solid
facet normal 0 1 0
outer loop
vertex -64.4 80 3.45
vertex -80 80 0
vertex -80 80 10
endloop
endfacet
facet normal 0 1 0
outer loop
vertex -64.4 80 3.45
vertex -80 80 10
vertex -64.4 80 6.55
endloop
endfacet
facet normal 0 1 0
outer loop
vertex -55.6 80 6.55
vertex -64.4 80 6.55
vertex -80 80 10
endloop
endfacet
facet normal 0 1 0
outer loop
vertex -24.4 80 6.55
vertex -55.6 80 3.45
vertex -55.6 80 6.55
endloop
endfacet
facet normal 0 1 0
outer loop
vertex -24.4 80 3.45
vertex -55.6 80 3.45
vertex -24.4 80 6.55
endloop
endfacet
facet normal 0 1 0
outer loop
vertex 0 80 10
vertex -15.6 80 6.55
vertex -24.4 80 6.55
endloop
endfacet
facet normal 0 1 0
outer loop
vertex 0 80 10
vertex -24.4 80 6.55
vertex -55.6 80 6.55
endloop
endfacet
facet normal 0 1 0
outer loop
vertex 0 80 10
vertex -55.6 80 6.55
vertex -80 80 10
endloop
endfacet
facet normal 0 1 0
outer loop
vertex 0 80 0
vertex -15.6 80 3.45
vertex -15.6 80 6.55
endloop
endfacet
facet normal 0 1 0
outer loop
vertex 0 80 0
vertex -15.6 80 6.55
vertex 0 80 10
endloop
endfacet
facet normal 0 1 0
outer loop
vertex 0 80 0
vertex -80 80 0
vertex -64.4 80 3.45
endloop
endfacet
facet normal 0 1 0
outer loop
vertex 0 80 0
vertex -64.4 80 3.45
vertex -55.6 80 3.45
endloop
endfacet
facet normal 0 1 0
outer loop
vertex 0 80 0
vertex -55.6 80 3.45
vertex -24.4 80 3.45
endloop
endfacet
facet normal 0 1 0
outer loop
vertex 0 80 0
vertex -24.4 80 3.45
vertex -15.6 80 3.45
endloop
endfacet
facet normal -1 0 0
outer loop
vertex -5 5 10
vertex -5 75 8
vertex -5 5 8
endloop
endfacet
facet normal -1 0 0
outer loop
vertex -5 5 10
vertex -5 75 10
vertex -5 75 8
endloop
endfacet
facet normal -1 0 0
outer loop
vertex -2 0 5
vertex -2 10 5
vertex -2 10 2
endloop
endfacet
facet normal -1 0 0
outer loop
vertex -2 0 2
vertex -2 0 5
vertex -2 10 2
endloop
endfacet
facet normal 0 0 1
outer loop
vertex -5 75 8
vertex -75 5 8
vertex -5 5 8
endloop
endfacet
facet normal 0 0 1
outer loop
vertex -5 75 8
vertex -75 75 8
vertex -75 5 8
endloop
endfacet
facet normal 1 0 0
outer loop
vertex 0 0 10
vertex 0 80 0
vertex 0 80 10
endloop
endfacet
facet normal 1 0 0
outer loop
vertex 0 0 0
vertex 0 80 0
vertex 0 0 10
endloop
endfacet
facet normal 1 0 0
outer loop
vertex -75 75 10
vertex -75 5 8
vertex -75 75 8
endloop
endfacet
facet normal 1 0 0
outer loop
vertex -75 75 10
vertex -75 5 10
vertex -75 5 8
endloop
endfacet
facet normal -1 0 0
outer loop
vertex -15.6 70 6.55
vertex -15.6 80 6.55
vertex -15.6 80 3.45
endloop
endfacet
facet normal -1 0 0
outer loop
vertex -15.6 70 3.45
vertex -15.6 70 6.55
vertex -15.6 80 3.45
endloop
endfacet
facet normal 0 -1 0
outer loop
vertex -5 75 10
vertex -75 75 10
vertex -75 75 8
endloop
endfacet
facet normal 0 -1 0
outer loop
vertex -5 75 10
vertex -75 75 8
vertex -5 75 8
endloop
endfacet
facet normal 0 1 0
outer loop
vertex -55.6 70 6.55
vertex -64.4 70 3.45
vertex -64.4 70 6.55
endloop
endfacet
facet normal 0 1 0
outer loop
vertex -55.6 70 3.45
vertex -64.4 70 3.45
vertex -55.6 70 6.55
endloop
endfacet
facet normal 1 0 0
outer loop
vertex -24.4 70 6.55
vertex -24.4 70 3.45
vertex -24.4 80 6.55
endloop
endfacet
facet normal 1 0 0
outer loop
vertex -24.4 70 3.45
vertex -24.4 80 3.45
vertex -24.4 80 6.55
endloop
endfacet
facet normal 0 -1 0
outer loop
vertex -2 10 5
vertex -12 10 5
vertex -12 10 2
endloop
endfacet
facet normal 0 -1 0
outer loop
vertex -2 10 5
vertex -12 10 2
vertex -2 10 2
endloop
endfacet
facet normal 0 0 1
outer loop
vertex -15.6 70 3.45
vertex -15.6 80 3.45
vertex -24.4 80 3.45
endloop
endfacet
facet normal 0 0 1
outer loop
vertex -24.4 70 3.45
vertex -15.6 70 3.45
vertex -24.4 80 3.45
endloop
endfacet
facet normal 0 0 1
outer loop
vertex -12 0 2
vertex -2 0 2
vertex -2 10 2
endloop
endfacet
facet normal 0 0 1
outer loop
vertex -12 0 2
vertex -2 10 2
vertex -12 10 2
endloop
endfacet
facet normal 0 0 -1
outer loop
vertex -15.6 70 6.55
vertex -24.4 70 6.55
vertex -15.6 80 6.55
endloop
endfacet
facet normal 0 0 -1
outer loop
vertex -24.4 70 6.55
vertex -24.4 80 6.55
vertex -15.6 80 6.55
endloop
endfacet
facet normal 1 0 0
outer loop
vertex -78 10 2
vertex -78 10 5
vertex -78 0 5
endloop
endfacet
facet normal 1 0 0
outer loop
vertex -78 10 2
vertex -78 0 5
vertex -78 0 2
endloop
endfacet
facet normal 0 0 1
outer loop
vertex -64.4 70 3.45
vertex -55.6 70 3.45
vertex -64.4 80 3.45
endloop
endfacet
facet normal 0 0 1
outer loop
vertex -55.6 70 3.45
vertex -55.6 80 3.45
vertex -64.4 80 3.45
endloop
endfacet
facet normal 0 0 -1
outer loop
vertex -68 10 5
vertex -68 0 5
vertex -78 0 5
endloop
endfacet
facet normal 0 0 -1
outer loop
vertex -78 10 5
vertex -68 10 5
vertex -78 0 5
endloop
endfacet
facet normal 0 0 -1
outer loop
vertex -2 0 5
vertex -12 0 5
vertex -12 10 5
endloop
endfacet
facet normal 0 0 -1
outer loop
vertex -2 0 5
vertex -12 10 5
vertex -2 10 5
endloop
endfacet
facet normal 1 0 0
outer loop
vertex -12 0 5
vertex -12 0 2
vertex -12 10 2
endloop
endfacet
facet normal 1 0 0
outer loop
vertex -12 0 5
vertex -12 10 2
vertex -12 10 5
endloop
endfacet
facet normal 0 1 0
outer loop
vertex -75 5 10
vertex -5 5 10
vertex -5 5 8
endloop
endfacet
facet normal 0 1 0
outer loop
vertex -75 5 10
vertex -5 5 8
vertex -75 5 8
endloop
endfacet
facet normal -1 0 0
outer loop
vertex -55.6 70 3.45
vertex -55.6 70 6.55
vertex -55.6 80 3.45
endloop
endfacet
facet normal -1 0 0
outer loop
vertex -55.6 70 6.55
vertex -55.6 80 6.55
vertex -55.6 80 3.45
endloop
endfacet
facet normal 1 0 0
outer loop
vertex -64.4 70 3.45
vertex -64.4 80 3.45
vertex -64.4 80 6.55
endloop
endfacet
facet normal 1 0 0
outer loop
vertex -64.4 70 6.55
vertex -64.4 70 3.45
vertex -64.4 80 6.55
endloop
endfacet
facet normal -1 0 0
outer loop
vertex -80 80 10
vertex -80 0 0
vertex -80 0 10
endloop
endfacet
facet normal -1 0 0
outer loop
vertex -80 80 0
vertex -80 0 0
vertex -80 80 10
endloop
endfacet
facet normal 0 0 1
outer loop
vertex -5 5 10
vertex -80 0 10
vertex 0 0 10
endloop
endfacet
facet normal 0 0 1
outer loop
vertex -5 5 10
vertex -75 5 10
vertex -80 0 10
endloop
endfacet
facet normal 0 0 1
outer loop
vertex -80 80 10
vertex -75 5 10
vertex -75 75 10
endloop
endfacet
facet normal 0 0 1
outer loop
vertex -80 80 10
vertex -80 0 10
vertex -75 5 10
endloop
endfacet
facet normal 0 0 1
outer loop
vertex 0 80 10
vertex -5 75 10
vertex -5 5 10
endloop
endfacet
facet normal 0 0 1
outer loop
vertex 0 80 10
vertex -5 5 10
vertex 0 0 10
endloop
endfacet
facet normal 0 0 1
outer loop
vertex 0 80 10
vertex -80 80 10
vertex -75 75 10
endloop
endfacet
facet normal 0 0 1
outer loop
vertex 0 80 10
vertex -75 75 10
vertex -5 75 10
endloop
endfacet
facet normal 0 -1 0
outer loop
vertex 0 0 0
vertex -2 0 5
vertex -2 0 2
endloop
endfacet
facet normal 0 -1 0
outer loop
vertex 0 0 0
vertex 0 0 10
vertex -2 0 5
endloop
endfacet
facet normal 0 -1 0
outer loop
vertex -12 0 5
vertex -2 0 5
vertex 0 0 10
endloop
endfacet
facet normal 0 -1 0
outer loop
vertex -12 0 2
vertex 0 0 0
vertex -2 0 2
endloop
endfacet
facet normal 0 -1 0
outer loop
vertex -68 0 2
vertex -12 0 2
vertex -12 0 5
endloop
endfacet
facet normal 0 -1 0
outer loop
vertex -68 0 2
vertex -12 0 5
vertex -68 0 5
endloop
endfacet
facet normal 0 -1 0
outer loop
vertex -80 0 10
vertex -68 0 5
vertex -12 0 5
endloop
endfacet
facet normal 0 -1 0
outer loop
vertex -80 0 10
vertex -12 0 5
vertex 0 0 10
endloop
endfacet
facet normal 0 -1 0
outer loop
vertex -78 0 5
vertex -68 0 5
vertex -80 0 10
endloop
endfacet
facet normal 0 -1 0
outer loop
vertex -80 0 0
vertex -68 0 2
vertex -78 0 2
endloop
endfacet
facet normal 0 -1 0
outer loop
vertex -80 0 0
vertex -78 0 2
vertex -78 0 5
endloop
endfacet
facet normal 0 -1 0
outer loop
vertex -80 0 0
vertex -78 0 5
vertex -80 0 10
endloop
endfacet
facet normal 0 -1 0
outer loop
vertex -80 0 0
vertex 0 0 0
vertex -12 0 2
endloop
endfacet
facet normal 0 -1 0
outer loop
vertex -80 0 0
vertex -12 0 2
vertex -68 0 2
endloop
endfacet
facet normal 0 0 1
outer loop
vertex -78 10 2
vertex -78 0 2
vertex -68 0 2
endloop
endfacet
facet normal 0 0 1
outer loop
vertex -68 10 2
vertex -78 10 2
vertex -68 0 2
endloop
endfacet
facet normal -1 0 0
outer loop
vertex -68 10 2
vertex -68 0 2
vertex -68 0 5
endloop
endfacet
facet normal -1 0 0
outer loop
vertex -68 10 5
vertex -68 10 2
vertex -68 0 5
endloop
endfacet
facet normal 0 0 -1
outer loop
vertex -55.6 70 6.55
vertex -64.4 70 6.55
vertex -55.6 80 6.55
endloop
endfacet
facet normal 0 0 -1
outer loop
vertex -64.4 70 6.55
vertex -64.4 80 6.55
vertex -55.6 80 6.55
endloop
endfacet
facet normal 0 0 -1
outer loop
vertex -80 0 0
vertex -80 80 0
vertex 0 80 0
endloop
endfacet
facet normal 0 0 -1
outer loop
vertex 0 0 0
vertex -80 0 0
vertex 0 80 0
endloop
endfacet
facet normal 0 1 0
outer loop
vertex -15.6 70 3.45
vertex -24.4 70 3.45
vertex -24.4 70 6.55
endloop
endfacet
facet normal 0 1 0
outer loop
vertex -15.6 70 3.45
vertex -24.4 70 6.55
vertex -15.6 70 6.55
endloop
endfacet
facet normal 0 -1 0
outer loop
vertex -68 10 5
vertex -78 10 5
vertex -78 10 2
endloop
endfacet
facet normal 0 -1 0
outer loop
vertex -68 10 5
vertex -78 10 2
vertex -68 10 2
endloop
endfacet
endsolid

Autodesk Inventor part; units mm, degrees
ref_plane "YZ Plane" through (0, 0, 0) normal (1, 0, 0) x (0, 1, 0)
ref_plane "XZ Plane" through (0, 0, 0) normal (0, 1, 0) x (-1, 0, 0)
ref_plane "XY Plane" through (0, 0, 0) normal (0, 0, 1) x (1, 0, 0)
sketch "Sketch1" plane through (0, 0, 0) normal (0, 0, 1) x (1, 0, 0)
  line L0 (0, 0) -> (-80, 0)
  line L1 (-80, 0) -> (-80, 80)
  line L2 (-80, 80) -> (0, 80)
  line L3 (0, 80) -> (0, 0)
  line L4 (-75, 75) -> (-5, 75)
  line L5 (-5, 75) -> (-5, 5)
  line L6 (-5, 5) -> (-75, 5)
  line L7 (-75, 5) -> (-75, 75)
  dimension "d0" = 80
  dimension "d1" = 80
  dimension "d2" = 70
  dimension "d3" = 70
extrude "Extrusion1" add sketch "Sketch1" along normal blind 10 contours L0 L1 L2 L3 | L4 L5 L6 L7
sketch "Sketch2" plane through (-80, 80, 0) normal (0, 1, 0) x (1, 0, 0)
  line L0 (24.4, -3.45) -> (15.6, -3.45)
  line L1 (15.6, -3.45) -> (15.6, -6.55)
  line L2 (15.6, -6.55) -> (24.4, -6.55)
  line L3 (24.4, -6.55) -> (24.4, -3.45)
  line L4 (64.4, -3.45) -> (55.6, -3.45)
  line L5 (55.6, -3.45) -> (55.6, -6.55)
  line L6 (55.6, -6.55) -> (64.4, -6.55)
  line L7 (64.4, -6.55) -> (64.4, -3.45)
  point P0 (80, 0)
  point P1 (20, -5)
  point P2 (60, -5)
  dimension "d8" = 8.8
  dimension "d9" = 3.1
  dimension "d12" = 8.8
  dimension "d13" = 3.1
extrude "Extrusion2" cut sketch "Sketch2" against normal blind 10
sketch "Sketch4" plane through (0, 0, 10) normal (0, 0, 1) x (1, 0, 0)
  line L0 (-5, 5) -> (-75, 5)
  line L1 (-75, 5) -> (-75, 75)
  line L2 (-75, 75) -> (-5, 75)
  line L3 (-5, 75) -> (-5, 5)
  point P0 (0, 0)
  dimension "d21" = 70
  dimension "d22" = 70
extrude "Extrusion3" cut sketch "Sketch4" against normal blind 2
sketch "Sketch5" plane through (-80, 0, 0) normal (0, -1, 0) x (1, 0, 0)
  line L0 (2, 2) -> (12, 2)
  line L1 (12, 2) -> (12, 5)
  line L2 (12, 5) -> (2, 5)
  line L3 (2, 5) -> (2, 2)
  line L4 (78, 2) -> (68, 2)
  line L5 (68, 2) -> (68, 5)
  line L6 (68, 5) -> (78, 5)
  line L7 (78, 5) -> (78, 2)
  point P0 (80, 0)
  dimension "d25" = 10
  dimension "d26" = 3
  dimension "d27" = 10
  dimension "d28" = 3
extrude "Extrusion4" cut sketch "Sketch5" against normal blind 10
properties part number "Marker_TestFit"
